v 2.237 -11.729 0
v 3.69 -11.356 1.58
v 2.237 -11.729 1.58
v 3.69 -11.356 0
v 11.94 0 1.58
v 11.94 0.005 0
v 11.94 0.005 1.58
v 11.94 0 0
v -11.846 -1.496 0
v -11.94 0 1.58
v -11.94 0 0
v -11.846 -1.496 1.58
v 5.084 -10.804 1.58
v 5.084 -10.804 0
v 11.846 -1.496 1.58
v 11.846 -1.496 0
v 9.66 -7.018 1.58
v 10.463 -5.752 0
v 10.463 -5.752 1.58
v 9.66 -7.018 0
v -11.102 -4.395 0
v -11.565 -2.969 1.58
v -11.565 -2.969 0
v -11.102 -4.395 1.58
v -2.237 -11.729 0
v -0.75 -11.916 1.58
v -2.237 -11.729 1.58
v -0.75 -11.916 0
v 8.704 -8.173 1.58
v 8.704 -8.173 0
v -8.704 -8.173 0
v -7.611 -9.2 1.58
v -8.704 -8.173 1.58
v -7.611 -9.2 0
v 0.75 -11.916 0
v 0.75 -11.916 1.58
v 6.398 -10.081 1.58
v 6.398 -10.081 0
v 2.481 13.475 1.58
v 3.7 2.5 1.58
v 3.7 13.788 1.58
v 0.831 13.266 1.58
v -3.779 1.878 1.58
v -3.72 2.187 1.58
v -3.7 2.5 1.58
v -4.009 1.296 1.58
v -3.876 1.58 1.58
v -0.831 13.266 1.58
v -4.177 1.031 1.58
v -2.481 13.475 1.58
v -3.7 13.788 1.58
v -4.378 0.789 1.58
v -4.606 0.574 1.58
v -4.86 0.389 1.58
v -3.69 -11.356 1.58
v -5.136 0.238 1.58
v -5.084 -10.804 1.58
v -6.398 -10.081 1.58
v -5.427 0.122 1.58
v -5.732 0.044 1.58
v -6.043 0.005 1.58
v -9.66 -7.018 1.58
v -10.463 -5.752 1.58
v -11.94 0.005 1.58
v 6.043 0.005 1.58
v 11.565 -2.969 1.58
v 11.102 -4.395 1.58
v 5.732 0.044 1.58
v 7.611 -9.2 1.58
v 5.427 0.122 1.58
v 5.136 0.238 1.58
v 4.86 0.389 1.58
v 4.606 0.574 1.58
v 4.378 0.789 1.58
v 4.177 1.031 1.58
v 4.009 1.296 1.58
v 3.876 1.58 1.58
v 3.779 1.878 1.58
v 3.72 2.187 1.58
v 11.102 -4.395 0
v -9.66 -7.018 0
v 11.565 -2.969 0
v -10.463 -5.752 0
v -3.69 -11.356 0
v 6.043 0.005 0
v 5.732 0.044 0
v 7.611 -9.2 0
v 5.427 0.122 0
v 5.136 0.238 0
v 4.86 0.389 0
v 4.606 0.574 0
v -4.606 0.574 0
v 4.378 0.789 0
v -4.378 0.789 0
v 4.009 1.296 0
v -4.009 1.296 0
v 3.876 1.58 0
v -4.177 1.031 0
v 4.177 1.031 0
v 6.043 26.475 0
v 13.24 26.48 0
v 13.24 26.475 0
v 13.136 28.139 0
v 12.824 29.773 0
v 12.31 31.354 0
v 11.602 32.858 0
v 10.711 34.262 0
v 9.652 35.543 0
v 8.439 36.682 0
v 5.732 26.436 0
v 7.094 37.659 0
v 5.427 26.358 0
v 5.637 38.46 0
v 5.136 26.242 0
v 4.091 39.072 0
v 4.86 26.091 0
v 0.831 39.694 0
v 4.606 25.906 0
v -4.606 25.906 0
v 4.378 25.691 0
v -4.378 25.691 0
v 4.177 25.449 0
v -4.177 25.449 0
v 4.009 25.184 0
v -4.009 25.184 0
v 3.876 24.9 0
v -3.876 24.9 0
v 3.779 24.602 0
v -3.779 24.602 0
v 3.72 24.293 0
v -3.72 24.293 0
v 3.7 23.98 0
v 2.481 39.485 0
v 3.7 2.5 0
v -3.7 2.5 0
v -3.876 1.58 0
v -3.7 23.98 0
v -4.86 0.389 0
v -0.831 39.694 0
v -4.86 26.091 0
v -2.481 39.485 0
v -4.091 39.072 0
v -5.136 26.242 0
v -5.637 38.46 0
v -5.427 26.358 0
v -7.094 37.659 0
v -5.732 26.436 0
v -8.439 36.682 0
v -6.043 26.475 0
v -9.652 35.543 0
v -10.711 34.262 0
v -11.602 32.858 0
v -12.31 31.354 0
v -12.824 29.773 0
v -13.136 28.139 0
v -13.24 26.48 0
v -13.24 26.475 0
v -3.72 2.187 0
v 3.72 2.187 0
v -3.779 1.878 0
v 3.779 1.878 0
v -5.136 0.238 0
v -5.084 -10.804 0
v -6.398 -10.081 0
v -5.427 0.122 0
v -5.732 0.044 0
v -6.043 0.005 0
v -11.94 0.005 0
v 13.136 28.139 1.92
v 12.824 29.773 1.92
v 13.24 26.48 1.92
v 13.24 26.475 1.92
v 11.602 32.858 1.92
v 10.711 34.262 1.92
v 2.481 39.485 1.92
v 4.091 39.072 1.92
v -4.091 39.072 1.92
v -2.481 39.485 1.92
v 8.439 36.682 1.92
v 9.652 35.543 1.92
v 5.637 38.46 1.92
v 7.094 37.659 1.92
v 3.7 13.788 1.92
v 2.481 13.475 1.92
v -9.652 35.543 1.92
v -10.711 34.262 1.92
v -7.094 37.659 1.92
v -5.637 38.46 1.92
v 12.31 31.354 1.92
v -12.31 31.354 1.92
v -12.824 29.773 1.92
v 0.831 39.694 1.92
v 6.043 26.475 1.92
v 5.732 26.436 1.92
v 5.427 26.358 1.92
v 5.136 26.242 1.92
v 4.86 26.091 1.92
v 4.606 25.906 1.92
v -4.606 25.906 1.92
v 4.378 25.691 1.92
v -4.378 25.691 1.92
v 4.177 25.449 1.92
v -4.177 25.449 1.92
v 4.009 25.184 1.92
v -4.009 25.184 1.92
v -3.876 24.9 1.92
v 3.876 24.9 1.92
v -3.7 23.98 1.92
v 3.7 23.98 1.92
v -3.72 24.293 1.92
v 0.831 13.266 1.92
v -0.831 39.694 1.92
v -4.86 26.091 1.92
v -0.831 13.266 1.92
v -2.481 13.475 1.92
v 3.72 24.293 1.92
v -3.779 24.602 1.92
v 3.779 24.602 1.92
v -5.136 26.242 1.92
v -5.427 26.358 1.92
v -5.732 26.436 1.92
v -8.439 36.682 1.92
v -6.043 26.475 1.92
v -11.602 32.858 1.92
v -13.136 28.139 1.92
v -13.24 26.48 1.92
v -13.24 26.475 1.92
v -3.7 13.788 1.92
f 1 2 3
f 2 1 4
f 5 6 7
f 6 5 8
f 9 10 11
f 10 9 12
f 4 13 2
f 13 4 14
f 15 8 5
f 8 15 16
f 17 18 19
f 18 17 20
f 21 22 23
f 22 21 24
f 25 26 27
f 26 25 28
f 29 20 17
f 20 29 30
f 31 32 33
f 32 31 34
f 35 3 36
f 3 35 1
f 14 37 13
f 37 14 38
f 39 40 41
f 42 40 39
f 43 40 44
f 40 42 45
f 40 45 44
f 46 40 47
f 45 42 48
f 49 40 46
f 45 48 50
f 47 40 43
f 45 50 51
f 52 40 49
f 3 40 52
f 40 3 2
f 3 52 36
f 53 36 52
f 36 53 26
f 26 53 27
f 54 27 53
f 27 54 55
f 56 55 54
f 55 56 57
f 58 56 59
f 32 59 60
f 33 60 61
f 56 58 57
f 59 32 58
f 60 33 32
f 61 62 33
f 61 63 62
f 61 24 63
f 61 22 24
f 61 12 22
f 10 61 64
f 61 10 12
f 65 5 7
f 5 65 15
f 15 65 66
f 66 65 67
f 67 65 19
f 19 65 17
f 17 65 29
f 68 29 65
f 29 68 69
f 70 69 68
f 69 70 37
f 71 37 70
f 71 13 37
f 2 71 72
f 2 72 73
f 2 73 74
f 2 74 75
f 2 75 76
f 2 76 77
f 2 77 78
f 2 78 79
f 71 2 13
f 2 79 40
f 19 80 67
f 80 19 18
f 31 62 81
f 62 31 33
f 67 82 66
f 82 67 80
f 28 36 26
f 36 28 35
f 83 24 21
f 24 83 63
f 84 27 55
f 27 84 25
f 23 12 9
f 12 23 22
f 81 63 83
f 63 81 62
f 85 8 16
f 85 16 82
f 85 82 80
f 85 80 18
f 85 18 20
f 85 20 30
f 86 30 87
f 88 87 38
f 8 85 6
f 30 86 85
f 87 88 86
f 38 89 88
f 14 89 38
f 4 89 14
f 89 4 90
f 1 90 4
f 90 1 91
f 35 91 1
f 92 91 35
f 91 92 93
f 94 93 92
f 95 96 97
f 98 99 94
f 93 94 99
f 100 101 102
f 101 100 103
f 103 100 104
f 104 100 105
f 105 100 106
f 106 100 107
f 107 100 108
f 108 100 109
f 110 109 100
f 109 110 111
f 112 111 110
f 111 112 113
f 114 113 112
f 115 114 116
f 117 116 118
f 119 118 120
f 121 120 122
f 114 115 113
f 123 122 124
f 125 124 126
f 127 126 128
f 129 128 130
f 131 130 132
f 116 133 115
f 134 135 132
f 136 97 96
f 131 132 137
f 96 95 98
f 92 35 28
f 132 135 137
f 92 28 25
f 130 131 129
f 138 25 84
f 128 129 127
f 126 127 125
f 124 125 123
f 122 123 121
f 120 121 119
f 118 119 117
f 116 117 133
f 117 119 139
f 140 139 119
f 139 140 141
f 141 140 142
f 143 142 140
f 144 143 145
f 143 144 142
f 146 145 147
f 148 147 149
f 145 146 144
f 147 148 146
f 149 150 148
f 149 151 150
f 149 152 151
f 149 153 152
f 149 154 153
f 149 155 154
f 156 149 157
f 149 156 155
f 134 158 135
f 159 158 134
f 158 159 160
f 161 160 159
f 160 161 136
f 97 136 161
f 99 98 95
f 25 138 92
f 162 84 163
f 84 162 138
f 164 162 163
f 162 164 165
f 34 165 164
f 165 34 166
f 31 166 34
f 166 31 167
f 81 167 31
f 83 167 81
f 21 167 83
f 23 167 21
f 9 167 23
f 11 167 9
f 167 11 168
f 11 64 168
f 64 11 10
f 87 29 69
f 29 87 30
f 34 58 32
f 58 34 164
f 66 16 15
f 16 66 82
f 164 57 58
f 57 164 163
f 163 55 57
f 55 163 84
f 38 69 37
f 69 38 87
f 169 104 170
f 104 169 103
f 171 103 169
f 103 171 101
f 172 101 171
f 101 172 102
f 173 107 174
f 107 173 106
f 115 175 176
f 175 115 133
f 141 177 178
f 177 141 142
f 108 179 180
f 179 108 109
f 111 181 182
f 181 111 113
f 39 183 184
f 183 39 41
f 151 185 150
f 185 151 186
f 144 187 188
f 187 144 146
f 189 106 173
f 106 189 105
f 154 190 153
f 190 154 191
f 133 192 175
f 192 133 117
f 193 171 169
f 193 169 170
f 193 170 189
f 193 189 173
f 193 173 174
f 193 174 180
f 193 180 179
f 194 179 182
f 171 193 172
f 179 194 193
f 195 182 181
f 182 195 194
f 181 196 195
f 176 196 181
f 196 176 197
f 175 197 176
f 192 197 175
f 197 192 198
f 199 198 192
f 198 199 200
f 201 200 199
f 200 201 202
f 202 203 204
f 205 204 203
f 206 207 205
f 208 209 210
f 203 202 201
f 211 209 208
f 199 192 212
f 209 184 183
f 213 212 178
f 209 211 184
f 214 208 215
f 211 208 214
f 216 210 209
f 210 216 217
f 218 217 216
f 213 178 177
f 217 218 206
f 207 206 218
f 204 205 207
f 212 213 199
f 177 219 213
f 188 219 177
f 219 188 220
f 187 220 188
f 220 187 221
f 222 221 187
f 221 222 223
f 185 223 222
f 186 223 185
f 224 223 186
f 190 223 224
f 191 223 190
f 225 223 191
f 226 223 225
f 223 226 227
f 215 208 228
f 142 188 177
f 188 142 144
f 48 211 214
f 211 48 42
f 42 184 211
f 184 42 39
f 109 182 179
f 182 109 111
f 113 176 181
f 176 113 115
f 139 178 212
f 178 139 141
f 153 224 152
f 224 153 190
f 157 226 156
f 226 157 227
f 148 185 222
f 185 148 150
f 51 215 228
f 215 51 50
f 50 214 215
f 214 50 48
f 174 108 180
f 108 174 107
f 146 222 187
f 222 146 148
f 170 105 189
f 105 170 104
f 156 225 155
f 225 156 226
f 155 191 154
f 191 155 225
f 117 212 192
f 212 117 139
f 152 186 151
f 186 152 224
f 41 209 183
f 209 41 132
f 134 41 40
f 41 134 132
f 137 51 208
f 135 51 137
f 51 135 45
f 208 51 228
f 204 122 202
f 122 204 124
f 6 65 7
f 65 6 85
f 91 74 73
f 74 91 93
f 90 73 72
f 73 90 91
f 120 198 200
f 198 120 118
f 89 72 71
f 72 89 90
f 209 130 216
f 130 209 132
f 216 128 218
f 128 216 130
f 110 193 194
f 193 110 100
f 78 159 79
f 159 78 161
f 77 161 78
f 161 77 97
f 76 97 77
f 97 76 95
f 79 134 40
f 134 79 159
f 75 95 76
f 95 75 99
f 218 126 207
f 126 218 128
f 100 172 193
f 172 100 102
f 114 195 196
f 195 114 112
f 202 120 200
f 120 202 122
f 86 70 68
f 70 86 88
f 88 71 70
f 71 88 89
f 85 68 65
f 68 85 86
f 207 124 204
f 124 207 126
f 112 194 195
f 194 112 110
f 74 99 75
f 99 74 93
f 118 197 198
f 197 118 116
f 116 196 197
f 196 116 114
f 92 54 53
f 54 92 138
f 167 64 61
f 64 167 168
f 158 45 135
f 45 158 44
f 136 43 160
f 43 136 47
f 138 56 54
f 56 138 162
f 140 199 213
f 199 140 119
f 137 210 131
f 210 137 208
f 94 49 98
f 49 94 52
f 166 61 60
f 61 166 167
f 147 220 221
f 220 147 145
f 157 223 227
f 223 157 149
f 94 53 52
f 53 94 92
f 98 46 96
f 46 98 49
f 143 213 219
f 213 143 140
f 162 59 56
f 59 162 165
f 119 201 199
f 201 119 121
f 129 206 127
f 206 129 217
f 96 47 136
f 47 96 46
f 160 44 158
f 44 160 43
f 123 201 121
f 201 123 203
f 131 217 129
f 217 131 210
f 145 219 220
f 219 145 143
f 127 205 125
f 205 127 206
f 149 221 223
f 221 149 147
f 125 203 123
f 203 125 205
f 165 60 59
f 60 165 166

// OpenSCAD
// Coin 1
Dia1=23.88;
Thick1=1.58;
// Coin 2
Dia2=26.48;
Thick2=1.92;
// Print Setting
MinWall=1.2; //Minimum wall thickness
RingDia=5; //Key Ring Diameter
$fn=50;

// Calculations
Separation=max(Dia1,Dia2);
Thick=min(Thick1,Thick2);
MThick=max(Thick1,Thick2);

difference(){
    union(){
        cylinder(d=Dia1,h=Thick1);
        translate([0,Separation,0])cylinder(d=Dia2,h=Thick2);
        translate([-(RingDia+MinWall*2)/2,0,0])cube([RingDia+MinWall*2,Separation,Thick]);
    }
    union(){
        translate([RingDia+MinWall,RingDia/2,-MThick/2])minkowski(){
            cube([Separation-RingDia,Separation-RingDia,MThick]);
            cylinder(d=RingDia,h=MThick);
        }
        translate([-Separation-MinWall,RingDia/2,-MThick/2])minkowski(){
            cube([Separation-RingDia,Separation-RingDia,MThick]);
            cylinder(d=RingDia,h=MThick);
        }
        //translate([0,RingDia,-Thick/2])cylinder(d=RingDia,h=Thick*2);
        //translate([0,Separation-RingDia,-Thick/2])cylinder(d=RingDia,h=Thick*2);
        //translate([-RingDia/2,RingDia,-Thick/2])cube([RingDia,Separation-RingDia*2,Thick*2]);
    }
}


// Remix of http://www.thingiverse.com/thing:233194/#files
